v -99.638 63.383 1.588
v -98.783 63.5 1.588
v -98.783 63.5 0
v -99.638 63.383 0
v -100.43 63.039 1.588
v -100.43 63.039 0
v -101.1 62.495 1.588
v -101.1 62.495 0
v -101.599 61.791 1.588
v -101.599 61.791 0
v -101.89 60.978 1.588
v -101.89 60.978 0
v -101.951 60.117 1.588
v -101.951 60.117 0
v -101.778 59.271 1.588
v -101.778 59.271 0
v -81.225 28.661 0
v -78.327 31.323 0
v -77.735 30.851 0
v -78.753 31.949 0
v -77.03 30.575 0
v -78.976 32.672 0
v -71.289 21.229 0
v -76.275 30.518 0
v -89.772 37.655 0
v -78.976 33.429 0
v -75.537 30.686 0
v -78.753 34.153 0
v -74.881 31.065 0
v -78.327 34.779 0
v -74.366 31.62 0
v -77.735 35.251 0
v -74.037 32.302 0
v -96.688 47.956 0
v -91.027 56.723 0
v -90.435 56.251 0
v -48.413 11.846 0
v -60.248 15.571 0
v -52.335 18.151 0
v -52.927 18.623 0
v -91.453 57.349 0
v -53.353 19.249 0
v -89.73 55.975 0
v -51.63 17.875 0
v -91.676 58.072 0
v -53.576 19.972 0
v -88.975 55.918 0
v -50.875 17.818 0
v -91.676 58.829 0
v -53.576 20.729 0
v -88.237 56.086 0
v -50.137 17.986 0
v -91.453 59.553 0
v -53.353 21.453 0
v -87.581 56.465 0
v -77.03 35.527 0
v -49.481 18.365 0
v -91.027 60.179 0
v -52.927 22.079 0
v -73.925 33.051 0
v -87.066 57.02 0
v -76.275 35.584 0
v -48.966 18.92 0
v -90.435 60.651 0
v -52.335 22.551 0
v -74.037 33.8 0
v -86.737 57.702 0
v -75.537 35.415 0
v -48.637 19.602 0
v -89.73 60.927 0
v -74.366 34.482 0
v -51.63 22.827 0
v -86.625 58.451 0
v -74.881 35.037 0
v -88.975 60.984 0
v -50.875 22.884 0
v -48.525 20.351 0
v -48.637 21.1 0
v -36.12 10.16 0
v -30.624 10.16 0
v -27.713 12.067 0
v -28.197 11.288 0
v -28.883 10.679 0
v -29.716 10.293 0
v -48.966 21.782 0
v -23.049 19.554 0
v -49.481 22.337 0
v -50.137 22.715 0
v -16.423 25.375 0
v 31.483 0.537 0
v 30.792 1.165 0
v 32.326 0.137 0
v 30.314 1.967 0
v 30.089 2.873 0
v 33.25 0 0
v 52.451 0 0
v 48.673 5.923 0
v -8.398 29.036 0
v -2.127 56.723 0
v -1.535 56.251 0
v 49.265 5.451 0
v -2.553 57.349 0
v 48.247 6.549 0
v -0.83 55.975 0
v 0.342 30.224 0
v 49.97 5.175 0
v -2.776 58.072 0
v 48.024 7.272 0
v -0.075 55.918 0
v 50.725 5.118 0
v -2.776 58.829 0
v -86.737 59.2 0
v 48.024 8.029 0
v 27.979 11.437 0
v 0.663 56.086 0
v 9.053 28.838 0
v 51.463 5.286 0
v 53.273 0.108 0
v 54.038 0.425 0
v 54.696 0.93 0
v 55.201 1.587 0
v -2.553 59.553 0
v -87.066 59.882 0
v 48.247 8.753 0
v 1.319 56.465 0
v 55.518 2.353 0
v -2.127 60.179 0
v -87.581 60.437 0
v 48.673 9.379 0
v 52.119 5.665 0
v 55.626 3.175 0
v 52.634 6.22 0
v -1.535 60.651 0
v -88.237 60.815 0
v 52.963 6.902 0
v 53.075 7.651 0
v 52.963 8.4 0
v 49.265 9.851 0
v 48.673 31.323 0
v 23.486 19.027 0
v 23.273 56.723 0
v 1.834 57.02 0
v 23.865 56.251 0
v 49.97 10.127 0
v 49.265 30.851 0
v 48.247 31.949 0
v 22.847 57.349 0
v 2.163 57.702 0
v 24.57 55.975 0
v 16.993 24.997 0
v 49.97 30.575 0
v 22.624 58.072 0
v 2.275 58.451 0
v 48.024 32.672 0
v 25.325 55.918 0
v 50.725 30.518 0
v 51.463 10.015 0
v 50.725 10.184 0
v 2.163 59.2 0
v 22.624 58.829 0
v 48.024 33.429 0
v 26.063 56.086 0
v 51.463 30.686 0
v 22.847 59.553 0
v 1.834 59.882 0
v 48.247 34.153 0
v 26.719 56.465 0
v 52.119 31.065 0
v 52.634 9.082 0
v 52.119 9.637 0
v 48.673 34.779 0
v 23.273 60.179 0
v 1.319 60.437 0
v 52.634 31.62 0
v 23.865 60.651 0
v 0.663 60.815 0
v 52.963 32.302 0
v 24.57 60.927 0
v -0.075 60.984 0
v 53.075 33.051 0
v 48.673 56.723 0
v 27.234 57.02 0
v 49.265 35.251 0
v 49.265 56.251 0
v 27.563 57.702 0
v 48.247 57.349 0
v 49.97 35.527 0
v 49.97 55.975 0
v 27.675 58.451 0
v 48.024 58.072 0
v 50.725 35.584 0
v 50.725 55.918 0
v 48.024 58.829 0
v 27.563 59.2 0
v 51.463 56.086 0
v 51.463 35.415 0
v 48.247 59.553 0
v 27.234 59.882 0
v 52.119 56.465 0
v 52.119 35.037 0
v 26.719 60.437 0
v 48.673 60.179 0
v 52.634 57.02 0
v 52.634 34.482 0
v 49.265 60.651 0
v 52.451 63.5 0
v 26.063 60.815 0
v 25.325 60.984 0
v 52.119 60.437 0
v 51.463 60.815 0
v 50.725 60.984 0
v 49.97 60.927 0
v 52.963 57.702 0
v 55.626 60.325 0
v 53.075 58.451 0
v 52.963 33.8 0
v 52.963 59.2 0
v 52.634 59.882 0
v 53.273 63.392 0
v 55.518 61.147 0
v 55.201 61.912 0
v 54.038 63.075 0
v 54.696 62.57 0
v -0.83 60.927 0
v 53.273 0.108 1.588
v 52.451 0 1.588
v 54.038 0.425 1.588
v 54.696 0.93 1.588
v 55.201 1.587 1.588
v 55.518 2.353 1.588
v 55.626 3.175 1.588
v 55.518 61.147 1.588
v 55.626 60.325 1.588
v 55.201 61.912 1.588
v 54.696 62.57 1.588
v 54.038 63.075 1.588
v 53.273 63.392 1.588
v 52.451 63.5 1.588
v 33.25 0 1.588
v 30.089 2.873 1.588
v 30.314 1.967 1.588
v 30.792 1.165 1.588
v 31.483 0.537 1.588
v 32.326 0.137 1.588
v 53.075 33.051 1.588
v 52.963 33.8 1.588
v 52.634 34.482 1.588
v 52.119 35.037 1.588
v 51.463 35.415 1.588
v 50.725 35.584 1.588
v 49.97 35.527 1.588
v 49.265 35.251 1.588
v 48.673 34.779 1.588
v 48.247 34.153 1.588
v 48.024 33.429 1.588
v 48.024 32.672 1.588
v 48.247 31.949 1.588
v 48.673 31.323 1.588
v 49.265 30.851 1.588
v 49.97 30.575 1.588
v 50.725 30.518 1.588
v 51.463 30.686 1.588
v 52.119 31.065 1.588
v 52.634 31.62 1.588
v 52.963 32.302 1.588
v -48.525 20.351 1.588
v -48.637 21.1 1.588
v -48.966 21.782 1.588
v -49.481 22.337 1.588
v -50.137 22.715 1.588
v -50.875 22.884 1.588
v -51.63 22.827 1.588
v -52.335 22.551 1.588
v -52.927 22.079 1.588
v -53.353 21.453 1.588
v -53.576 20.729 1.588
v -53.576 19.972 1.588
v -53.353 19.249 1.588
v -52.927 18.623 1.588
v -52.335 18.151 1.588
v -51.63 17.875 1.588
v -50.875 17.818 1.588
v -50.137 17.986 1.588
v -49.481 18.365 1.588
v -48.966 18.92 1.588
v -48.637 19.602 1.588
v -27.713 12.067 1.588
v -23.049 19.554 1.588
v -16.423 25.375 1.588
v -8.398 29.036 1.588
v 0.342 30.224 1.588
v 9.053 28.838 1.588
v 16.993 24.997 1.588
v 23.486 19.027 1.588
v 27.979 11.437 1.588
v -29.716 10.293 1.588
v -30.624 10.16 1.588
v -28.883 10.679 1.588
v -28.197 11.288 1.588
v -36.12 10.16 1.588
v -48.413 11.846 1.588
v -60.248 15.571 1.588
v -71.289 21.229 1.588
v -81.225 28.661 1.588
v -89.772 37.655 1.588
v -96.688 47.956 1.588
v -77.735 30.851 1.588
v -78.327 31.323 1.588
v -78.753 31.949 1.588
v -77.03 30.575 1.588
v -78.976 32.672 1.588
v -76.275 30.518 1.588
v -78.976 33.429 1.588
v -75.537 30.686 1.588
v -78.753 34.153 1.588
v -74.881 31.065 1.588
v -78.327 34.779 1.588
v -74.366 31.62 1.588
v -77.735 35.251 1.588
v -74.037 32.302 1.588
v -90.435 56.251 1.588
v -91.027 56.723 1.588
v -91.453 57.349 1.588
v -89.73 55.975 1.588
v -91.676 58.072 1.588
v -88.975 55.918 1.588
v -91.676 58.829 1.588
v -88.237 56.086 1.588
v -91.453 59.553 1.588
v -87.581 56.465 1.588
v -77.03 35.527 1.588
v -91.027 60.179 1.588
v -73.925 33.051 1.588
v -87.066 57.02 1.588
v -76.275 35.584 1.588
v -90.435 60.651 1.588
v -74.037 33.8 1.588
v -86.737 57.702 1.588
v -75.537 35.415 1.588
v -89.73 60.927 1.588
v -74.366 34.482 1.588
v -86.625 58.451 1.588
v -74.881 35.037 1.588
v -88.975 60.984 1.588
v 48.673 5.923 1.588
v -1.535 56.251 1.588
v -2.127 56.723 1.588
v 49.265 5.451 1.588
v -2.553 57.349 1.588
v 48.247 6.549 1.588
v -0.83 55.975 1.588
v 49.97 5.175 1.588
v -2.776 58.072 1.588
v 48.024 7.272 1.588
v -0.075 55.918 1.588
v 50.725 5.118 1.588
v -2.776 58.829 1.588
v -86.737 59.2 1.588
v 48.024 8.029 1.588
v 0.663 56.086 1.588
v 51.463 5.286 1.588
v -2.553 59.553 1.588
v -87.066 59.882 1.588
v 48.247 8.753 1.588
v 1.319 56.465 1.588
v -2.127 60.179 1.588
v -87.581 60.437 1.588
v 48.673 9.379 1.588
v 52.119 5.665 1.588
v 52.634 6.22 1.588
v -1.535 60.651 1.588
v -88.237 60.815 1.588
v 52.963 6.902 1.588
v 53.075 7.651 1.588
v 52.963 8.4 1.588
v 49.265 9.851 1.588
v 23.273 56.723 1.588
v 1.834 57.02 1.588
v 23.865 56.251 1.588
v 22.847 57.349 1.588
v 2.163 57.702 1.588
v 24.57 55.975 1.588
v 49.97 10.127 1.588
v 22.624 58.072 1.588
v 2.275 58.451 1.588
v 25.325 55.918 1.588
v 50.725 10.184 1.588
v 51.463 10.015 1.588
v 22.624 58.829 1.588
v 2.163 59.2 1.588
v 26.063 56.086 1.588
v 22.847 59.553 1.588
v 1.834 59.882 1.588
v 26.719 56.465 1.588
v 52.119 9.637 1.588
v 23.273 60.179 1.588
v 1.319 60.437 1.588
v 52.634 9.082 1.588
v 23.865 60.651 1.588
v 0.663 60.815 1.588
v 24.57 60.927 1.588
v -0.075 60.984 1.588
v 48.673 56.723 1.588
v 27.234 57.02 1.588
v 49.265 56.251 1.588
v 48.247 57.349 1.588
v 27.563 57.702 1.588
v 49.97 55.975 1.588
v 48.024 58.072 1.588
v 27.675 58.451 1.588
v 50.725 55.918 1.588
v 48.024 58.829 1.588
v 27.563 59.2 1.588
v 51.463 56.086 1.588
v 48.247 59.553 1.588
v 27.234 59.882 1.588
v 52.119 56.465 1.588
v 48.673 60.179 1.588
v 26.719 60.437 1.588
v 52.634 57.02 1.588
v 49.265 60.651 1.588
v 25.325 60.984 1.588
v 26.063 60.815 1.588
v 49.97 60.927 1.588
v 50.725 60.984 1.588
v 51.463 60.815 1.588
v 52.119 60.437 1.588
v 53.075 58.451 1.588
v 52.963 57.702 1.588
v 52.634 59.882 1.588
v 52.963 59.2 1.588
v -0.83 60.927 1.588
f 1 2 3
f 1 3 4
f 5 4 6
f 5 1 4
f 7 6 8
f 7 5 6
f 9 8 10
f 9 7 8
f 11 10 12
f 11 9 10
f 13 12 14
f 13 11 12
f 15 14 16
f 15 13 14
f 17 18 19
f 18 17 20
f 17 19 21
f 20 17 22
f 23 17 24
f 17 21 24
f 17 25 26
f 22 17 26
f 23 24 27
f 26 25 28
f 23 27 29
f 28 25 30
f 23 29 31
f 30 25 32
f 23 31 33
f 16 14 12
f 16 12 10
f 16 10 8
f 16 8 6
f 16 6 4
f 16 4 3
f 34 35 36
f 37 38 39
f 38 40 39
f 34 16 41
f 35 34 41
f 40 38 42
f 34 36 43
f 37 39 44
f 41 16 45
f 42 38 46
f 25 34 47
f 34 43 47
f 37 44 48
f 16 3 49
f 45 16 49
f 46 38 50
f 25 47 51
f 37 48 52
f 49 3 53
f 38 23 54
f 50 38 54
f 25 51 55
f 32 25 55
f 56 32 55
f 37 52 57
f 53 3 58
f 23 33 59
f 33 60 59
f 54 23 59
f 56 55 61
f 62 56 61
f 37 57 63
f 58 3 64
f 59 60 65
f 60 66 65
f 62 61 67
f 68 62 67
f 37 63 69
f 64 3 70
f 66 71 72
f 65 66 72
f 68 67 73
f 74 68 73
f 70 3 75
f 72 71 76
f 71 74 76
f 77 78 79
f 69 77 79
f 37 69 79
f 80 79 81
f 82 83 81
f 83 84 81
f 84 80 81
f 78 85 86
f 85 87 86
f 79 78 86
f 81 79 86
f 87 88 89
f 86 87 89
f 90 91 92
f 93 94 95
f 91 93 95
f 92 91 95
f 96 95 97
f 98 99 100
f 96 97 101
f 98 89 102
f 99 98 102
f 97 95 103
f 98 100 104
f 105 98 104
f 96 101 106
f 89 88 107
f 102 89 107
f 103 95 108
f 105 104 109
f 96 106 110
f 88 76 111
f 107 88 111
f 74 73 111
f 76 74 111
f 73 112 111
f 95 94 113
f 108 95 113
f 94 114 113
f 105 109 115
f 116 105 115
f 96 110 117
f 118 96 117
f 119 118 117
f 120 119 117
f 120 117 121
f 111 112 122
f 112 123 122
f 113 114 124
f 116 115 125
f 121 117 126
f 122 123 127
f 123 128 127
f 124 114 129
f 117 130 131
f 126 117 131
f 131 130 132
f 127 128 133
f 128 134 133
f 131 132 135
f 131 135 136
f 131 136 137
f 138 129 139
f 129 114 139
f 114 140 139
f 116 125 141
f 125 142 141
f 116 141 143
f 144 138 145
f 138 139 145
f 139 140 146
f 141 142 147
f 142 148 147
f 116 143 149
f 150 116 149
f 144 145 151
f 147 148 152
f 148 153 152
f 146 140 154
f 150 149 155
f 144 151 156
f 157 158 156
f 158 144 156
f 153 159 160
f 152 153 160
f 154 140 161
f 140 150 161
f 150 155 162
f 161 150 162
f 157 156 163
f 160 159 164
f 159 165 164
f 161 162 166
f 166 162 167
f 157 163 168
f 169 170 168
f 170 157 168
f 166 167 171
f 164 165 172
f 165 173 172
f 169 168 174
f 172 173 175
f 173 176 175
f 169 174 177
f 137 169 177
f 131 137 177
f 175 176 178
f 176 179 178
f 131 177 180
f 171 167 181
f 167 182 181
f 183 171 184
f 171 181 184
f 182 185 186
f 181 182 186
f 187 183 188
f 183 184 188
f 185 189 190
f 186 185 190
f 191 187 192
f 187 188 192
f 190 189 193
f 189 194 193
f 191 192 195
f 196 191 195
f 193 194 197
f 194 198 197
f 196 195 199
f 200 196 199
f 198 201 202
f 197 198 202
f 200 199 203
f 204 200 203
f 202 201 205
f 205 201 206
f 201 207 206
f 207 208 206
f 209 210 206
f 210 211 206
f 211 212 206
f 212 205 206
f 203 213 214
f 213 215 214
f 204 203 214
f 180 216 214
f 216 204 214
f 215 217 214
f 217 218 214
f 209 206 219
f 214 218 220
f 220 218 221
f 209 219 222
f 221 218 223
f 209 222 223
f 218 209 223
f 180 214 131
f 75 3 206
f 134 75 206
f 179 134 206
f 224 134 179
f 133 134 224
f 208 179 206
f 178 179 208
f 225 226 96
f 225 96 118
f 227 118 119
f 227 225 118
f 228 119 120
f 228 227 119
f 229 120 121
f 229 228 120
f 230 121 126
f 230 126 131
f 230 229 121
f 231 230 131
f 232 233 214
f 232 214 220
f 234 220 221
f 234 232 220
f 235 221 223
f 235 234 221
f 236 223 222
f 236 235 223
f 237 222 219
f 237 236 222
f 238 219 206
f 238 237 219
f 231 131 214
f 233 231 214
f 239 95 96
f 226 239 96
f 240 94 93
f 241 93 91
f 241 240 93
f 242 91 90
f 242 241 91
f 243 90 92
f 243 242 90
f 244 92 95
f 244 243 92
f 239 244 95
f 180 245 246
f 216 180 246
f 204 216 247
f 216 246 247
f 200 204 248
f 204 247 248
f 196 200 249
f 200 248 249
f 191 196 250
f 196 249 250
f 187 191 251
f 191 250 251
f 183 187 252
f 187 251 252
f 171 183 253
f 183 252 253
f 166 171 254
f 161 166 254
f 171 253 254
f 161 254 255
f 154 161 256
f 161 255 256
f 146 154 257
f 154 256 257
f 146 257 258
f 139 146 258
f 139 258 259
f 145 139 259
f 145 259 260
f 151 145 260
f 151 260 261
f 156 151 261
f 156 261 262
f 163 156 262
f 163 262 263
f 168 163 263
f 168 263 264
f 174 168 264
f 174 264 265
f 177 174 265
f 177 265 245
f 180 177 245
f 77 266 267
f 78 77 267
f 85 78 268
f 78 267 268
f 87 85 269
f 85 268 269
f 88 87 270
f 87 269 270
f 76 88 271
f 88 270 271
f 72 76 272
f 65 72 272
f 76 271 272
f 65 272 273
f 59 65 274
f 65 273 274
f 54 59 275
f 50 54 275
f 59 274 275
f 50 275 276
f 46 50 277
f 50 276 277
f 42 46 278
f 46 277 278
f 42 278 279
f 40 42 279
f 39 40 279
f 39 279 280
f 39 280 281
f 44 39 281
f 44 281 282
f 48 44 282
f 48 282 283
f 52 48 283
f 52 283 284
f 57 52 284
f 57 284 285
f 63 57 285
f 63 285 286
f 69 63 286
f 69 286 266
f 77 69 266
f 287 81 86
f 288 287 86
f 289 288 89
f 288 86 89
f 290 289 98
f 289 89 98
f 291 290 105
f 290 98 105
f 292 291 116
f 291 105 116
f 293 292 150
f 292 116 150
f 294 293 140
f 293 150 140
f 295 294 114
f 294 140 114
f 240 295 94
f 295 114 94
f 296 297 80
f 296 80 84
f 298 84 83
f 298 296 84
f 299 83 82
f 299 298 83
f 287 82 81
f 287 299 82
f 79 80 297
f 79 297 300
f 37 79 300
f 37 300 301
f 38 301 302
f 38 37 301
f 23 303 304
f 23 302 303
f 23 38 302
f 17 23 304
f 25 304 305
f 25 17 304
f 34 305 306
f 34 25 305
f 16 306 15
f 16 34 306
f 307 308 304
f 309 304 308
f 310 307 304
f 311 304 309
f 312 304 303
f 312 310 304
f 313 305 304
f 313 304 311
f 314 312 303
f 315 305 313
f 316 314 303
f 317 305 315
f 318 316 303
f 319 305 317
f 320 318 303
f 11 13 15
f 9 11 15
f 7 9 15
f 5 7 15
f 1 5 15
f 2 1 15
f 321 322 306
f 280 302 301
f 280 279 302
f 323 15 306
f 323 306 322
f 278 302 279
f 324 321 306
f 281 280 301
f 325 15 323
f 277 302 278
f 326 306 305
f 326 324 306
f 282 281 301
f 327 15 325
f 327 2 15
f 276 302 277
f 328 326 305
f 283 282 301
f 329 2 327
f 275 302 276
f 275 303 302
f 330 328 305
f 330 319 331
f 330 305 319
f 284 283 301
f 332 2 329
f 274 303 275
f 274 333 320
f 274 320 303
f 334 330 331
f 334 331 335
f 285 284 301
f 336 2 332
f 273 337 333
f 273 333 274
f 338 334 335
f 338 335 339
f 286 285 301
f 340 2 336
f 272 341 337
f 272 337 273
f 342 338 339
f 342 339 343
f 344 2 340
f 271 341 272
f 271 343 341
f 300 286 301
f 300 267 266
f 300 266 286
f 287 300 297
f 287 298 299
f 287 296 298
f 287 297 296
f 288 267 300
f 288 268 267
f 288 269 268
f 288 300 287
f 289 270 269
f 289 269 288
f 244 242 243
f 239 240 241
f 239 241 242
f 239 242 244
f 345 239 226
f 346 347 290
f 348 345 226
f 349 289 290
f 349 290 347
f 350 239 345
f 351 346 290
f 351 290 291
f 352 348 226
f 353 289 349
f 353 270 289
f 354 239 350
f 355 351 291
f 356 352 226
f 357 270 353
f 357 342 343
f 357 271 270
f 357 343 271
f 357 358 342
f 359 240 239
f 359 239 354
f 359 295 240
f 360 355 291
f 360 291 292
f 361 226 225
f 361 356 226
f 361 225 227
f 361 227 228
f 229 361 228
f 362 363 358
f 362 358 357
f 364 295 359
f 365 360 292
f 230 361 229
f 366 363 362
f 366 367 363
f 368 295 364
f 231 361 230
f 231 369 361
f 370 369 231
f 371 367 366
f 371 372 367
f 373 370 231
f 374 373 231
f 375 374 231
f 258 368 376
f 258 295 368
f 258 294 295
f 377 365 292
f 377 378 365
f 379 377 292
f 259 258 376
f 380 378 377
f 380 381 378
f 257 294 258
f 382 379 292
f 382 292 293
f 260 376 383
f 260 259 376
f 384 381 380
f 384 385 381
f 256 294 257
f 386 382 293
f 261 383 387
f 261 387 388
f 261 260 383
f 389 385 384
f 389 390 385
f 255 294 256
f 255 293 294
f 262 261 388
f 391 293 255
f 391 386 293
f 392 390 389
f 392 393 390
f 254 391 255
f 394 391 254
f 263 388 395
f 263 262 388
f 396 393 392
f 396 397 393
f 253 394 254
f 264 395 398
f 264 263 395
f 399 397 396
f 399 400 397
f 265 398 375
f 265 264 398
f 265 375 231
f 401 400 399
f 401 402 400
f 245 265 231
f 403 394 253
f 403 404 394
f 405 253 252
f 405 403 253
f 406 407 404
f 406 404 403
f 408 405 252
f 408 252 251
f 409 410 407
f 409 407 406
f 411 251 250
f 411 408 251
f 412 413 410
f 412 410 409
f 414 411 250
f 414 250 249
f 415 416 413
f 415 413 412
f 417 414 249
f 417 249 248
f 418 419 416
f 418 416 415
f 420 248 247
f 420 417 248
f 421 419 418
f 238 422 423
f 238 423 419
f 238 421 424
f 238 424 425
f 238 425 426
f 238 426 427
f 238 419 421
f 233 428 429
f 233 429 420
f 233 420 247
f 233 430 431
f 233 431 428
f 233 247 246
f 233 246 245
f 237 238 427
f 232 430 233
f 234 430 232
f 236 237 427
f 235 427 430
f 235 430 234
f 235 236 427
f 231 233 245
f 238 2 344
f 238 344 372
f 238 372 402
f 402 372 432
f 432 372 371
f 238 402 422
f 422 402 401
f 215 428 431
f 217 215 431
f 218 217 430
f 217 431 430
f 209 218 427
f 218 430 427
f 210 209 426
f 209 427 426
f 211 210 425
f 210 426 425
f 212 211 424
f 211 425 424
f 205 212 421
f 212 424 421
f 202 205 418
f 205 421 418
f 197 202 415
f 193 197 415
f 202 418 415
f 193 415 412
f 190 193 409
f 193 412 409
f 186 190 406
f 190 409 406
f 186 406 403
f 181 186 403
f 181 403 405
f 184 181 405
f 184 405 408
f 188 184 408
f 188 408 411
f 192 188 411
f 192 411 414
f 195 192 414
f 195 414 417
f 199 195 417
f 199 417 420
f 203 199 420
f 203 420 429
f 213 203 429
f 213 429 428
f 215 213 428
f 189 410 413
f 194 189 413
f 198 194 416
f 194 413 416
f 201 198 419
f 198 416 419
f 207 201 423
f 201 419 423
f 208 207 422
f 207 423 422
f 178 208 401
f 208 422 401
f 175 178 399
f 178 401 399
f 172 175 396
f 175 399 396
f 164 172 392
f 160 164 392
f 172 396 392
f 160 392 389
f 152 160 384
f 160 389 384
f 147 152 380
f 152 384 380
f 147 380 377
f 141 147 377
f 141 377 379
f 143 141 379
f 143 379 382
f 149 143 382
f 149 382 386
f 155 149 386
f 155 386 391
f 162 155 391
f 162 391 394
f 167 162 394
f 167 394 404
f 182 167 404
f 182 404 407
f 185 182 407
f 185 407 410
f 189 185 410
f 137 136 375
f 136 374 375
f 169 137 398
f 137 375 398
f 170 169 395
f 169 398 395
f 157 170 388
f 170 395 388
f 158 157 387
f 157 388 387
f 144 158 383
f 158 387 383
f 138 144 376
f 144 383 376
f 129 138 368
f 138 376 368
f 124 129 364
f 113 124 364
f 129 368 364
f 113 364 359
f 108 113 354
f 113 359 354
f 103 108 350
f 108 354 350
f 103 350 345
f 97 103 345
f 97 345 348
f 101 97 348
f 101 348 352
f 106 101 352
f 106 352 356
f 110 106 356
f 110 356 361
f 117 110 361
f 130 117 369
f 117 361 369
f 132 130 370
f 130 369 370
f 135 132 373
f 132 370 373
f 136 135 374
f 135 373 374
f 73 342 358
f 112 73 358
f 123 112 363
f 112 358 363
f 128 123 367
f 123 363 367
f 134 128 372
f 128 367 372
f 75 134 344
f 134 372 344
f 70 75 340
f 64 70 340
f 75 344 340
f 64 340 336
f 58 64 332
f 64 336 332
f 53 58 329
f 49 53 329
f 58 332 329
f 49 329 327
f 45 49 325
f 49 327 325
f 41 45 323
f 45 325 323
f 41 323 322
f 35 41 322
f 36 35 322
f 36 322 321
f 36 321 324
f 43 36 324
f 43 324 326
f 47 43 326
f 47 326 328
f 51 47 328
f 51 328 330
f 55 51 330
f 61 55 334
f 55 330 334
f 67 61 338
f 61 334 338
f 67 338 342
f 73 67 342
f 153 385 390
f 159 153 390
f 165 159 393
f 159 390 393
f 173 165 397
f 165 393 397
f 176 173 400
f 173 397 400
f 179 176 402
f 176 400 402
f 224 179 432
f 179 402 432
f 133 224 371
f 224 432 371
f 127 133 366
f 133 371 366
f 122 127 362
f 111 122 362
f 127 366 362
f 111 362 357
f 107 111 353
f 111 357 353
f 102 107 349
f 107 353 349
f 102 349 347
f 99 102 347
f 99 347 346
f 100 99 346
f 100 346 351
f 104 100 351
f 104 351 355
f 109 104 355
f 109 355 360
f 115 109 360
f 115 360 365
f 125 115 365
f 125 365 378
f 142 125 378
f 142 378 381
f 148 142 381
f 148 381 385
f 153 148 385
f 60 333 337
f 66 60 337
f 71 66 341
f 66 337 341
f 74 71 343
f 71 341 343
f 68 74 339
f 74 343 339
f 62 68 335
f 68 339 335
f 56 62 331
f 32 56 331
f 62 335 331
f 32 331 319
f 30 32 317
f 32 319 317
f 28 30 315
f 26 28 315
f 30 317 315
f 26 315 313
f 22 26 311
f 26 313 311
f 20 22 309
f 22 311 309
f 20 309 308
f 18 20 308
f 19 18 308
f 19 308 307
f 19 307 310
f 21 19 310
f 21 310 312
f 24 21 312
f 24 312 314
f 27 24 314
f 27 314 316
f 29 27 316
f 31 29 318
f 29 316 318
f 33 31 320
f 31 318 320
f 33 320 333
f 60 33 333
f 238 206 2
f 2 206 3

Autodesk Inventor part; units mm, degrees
ref_plane "YZ Plane" through (0, 0, 0) normal (1, 0, 0) x (0, 1, 0)
ref_plane "XZ Plane" through (0, 0, 0) normal (0, 1, 0) x (-1, 0, 0)
ref_plane "XY Plane" through (0, 0, 0) normal (0, 0, 1) x (1, 0, 0)
sketch "Sketch1" plane through (0, 0, 0) normal (0, 0, 1) x (1, 0, 0)
  circle A0 centre (0, 0) radius 30.226
  line L0 (30.226, 0) -> (55.626, 0)
  line L1 (55.626, 0) -> (55.626, 63.5)
  line L2 (55.626, 63.5) -> (-103.124, 63.5)
  line L3 (-28.4673, 10.16) -> (-103.124, 10.16)
  line L4 (-103.124, 10.16) -> (-103.124, 63.5)
  arc A1 (-103.124, 63.5) -> (-28.4673, 10.16) centre (-32.2937, 83.7205) ccw
  point P0 (-36.1202, 10.16)
  dimension "d0" = 60.452
  dimension "d1" = 25.4
  dimension "d2" = 63.5
  dimension "d3" = 158.75
  dimension "d4" = 53.34
  dimension "d7" = 73.66
extrude "Extrusion1" add sketch "Sketch1" along normal blind 1.5875 contours A0 L3 A1 L2 L1 L0
sketch "Sketch2" plane through (0, 0, 1.5875) normal (0, 0, 1) x (1, 0, 0)
  line L0 (50.5354, 58.4509) -> (55.6154, 58.4509)
  line L1 (50.5354, 58.4509) -> (50.5354, 63.5309)
  circle A0 centre (50.5354, 58.4509) radius 2.54
  line L2 (50.5354, 58.4509) -> (50.5354, 33.0509)
  circle A1 centre (50.5354, 33.0509) radius 2.54
  line L3 (50.5354, 33.0509) -> (50.5354, 7.6509)
  circle A2 centre (50.5354, 7.6509) radius 2.54
  line L4 (50.5354, 58.4509) -> (25.1354, 58.4509)
  circle A3 centre (25.1354, 58.4509) radius 2.54
  line L5 (25.1354, 58.4509) -> (-0.2646, 58.4509)
  circle A4 centre (-0.2646, 58.4509) radius 2.54
  line L6 (-0.2646, 58.4509) -> (-89.1646, 58.4509)
  circle A5 centre (-89.1646, 58.4509) radius 2.54
  line L7 (50.5354, 33.0509) -> (-76.4646, 33.0509)
  circle A6 centre (-76.4646, 33.0509) radius 2.54
  line L8 (50.5354, 20.3509) -> (-51.0646, 20.3509)
  circle A7 centre (-51.0646, 20.3509) radius 2.54
  point P0 (0, 0)
  dimension "d16" = 5.08
  dimension "d17" = 25.4
  dimension "d18" = 5.08
  dimension "d19" = 25.4
  dimension "d20" = 5.08
  dimension "d21" = 25.4
  dimension "d22" = 5.08
  dimension "d23" = 25.4
  dimension "d24" = 5.08
  dimension "d25" = 88.9
  dimension "d26" = 5.08
  dimension "d29" = 127
  dimension "d30" = 5.08
  dimension "d31" = 101.6
  dimension "d32" = 5.08
extrude "Extrusion2" cut sketch "Sketch2" against normal blind 25.4
fillet "Fillet1" radius 3.175 4 edges at (-103.124, 63.5, 0.7937) (55.626, 0, 0.7937) (30.226, 0, 0.7937) (55.626, 63.5, 0.7937)
fillet "Fillet2" radius 3.175 1 edges at (-28.4673, 10.16, 0.7937)
properties part number "Horizontal climb"
